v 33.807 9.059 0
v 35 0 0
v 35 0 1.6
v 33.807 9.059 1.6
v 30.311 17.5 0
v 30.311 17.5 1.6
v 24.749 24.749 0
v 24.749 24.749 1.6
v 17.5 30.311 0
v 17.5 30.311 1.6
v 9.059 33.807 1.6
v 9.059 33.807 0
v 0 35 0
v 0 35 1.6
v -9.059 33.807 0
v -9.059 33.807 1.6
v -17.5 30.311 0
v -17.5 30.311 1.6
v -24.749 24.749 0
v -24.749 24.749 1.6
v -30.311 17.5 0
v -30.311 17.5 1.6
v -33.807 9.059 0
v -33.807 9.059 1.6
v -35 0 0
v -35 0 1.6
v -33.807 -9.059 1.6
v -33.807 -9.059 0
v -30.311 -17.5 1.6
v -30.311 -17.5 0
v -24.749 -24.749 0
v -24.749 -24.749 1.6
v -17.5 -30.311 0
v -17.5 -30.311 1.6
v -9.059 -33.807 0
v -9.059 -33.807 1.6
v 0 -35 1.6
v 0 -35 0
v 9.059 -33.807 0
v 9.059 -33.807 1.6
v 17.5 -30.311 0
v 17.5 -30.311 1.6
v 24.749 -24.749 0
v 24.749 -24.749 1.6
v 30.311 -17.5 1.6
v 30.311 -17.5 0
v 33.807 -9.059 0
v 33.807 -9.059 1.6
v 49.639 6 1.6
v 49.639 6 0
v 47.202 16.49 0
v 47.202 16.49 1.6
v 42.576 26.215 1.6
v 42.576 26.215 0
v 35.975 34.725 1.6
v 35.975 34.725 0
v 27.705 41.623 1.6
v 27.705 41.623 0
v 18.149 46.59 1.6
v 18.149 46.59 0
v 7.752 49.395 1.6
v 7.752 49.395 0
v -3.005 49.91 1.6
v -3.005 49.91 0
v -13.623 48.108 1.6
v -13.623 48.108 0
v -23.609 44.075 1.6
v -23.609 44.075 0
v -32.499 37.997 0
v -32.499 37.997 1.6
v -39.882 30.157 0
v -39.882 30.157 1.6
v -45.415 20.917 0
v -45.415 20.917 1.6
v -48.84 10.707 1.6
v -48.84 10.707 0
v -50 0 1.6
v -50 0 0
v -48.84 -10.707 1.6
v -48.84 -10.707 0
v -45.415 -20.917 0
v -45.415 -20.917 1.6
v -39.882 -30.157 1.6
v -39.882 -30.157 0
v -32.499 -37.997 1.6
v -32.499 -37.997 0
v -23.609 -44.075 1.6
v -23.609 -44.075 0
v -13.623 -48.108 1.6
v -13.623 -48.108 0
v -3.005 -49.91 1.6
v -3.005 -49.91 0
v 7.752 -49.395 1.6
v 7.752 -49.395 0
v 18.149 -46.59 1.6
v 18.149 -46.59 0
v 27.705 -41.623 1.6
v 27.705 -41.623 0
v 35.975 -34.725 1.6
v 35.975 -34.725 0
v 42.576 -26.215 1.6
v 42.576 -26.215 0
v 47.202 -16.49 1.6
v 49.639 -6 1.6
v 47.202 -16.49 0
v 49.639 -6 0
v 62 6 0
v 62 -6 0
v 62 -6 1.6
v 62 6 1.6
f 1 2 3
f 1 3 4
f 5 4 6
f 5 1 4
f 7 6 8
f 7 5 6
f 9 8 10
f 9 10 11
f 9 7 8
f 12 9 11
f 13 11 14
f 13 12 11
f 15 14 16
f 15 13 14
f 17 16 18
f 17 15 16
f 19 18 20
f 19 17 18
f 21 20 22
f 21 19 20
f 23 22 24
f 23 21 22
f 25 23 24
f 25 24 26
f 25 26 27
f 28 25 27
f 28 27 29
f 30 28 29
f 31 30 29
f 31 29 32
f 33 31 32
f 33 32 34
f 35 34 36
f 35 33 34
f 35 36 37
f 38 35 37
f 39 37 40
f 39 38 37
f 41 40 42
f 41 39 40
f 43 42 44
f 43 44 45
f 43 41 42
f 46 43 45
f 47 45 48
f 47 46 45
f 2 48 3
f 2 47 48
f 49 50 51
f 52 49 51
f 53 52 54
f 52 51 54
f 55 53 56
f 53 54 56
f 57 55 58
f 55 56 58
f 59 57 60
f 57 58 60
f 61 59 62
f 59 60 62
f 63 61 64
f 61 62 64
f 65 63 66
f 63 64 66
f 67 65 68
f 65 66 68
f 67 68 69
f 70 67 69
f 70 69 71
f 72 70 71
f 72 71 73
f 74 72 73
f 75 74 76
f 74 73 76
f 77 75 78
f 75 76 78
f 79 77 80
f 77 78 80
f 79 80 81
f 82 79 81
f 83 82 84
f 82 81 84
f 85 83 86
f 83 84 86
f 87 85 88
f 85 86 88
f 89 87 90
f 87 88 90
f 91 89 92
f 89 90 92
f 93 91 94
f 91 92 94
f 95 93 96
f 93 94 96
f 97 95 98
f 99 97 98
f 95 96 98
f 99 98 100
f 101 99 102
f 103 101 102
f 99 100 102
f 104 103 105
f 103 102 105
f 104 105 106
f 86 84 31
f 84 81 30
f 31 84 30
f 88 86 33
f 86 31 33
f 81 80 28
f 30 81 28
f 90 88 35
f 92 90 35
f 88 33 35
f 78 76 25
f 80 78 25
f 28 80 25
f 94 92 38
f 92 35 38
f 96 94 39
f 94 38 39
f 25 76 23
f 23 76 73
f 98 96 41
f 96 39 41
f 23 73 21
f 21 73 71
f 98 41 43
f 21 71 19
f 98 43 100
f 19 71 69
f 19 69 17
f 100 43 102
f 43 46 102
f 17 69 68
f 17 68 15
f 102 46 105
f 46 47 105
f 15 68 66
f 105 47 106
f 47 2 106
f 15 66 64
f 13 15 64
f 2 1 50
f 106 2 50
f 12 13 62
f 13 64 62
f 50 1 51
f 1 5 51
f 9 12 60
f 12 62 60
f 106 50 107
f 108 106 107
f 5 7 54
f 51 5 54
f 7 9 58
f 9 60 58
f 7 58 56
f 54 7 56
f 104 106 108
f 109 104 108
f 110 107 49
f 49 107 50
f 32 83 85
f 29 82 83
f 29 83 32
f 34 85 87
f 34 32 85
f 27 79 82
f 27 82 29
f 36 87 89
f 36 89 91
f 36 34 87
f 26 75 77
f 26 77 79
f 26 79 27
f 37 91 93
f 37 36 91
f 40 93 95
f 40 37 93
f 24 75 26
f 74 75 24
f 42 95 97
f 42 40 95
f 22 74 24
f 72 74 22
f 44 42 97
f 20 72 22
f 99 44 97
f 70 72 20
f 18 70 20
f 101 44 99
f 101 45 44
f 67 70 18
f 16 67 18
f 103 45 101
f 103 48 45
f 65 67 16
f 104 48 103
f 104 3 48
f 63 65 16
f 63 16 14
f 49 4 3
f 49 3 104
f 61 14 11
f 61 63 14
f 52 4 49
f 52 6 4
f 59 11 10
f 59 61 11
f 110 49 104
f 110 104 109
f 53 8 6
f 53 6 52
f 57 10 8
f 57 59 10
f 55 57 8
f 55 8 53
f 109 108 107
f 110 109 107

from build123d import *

# Parameters (mm, degrees)
F0_R     = 35
F1_DEPTH = 1.6


with BuildPart() as f1:
    # F0 (on Top) → F1 (new body)
    with BuildSketch(Plane.XY):
        with BuildLine():
            ThreePointArc((49.638695, -6), (49.909592, -3.005434), (50, 0))
            ThreePointArc((50, 0), (49.909592, 3.005434), (49.638695, 6))
            Line((49.638695, 6), (38, 6))
            Line((38, 6), (38, -6))
            Line((38, -6), (49.638695, -6))
        make_face()
        with BuildLine():
            Line((38, 6), (49.638695, 6))
            ThreePointArc((49.638695, 6), (-50, 0), (49.638695, -6))
            Line((49.638695, -6), (38, -6))
            Line((38, -6), (38, 6))
        make_face()
        Circle(F0_R, mode=Mode.SUBTRACT)
        with BuildLine():
            ThreePointArc((49.638695, 6), (49.909592, 3.005434), (50, 0))
            ThreePointArc((50, 0), (49.909592, -3.005434), (49.638695, -6))
            Line((49.638695, -6), (62, -6))
            Line((62, -6), (62, 6))
            Line((62, 6), (49.638695, 6))
        make_face()
    extrude(amount=F1_DEPTH)


solid = f1.part
